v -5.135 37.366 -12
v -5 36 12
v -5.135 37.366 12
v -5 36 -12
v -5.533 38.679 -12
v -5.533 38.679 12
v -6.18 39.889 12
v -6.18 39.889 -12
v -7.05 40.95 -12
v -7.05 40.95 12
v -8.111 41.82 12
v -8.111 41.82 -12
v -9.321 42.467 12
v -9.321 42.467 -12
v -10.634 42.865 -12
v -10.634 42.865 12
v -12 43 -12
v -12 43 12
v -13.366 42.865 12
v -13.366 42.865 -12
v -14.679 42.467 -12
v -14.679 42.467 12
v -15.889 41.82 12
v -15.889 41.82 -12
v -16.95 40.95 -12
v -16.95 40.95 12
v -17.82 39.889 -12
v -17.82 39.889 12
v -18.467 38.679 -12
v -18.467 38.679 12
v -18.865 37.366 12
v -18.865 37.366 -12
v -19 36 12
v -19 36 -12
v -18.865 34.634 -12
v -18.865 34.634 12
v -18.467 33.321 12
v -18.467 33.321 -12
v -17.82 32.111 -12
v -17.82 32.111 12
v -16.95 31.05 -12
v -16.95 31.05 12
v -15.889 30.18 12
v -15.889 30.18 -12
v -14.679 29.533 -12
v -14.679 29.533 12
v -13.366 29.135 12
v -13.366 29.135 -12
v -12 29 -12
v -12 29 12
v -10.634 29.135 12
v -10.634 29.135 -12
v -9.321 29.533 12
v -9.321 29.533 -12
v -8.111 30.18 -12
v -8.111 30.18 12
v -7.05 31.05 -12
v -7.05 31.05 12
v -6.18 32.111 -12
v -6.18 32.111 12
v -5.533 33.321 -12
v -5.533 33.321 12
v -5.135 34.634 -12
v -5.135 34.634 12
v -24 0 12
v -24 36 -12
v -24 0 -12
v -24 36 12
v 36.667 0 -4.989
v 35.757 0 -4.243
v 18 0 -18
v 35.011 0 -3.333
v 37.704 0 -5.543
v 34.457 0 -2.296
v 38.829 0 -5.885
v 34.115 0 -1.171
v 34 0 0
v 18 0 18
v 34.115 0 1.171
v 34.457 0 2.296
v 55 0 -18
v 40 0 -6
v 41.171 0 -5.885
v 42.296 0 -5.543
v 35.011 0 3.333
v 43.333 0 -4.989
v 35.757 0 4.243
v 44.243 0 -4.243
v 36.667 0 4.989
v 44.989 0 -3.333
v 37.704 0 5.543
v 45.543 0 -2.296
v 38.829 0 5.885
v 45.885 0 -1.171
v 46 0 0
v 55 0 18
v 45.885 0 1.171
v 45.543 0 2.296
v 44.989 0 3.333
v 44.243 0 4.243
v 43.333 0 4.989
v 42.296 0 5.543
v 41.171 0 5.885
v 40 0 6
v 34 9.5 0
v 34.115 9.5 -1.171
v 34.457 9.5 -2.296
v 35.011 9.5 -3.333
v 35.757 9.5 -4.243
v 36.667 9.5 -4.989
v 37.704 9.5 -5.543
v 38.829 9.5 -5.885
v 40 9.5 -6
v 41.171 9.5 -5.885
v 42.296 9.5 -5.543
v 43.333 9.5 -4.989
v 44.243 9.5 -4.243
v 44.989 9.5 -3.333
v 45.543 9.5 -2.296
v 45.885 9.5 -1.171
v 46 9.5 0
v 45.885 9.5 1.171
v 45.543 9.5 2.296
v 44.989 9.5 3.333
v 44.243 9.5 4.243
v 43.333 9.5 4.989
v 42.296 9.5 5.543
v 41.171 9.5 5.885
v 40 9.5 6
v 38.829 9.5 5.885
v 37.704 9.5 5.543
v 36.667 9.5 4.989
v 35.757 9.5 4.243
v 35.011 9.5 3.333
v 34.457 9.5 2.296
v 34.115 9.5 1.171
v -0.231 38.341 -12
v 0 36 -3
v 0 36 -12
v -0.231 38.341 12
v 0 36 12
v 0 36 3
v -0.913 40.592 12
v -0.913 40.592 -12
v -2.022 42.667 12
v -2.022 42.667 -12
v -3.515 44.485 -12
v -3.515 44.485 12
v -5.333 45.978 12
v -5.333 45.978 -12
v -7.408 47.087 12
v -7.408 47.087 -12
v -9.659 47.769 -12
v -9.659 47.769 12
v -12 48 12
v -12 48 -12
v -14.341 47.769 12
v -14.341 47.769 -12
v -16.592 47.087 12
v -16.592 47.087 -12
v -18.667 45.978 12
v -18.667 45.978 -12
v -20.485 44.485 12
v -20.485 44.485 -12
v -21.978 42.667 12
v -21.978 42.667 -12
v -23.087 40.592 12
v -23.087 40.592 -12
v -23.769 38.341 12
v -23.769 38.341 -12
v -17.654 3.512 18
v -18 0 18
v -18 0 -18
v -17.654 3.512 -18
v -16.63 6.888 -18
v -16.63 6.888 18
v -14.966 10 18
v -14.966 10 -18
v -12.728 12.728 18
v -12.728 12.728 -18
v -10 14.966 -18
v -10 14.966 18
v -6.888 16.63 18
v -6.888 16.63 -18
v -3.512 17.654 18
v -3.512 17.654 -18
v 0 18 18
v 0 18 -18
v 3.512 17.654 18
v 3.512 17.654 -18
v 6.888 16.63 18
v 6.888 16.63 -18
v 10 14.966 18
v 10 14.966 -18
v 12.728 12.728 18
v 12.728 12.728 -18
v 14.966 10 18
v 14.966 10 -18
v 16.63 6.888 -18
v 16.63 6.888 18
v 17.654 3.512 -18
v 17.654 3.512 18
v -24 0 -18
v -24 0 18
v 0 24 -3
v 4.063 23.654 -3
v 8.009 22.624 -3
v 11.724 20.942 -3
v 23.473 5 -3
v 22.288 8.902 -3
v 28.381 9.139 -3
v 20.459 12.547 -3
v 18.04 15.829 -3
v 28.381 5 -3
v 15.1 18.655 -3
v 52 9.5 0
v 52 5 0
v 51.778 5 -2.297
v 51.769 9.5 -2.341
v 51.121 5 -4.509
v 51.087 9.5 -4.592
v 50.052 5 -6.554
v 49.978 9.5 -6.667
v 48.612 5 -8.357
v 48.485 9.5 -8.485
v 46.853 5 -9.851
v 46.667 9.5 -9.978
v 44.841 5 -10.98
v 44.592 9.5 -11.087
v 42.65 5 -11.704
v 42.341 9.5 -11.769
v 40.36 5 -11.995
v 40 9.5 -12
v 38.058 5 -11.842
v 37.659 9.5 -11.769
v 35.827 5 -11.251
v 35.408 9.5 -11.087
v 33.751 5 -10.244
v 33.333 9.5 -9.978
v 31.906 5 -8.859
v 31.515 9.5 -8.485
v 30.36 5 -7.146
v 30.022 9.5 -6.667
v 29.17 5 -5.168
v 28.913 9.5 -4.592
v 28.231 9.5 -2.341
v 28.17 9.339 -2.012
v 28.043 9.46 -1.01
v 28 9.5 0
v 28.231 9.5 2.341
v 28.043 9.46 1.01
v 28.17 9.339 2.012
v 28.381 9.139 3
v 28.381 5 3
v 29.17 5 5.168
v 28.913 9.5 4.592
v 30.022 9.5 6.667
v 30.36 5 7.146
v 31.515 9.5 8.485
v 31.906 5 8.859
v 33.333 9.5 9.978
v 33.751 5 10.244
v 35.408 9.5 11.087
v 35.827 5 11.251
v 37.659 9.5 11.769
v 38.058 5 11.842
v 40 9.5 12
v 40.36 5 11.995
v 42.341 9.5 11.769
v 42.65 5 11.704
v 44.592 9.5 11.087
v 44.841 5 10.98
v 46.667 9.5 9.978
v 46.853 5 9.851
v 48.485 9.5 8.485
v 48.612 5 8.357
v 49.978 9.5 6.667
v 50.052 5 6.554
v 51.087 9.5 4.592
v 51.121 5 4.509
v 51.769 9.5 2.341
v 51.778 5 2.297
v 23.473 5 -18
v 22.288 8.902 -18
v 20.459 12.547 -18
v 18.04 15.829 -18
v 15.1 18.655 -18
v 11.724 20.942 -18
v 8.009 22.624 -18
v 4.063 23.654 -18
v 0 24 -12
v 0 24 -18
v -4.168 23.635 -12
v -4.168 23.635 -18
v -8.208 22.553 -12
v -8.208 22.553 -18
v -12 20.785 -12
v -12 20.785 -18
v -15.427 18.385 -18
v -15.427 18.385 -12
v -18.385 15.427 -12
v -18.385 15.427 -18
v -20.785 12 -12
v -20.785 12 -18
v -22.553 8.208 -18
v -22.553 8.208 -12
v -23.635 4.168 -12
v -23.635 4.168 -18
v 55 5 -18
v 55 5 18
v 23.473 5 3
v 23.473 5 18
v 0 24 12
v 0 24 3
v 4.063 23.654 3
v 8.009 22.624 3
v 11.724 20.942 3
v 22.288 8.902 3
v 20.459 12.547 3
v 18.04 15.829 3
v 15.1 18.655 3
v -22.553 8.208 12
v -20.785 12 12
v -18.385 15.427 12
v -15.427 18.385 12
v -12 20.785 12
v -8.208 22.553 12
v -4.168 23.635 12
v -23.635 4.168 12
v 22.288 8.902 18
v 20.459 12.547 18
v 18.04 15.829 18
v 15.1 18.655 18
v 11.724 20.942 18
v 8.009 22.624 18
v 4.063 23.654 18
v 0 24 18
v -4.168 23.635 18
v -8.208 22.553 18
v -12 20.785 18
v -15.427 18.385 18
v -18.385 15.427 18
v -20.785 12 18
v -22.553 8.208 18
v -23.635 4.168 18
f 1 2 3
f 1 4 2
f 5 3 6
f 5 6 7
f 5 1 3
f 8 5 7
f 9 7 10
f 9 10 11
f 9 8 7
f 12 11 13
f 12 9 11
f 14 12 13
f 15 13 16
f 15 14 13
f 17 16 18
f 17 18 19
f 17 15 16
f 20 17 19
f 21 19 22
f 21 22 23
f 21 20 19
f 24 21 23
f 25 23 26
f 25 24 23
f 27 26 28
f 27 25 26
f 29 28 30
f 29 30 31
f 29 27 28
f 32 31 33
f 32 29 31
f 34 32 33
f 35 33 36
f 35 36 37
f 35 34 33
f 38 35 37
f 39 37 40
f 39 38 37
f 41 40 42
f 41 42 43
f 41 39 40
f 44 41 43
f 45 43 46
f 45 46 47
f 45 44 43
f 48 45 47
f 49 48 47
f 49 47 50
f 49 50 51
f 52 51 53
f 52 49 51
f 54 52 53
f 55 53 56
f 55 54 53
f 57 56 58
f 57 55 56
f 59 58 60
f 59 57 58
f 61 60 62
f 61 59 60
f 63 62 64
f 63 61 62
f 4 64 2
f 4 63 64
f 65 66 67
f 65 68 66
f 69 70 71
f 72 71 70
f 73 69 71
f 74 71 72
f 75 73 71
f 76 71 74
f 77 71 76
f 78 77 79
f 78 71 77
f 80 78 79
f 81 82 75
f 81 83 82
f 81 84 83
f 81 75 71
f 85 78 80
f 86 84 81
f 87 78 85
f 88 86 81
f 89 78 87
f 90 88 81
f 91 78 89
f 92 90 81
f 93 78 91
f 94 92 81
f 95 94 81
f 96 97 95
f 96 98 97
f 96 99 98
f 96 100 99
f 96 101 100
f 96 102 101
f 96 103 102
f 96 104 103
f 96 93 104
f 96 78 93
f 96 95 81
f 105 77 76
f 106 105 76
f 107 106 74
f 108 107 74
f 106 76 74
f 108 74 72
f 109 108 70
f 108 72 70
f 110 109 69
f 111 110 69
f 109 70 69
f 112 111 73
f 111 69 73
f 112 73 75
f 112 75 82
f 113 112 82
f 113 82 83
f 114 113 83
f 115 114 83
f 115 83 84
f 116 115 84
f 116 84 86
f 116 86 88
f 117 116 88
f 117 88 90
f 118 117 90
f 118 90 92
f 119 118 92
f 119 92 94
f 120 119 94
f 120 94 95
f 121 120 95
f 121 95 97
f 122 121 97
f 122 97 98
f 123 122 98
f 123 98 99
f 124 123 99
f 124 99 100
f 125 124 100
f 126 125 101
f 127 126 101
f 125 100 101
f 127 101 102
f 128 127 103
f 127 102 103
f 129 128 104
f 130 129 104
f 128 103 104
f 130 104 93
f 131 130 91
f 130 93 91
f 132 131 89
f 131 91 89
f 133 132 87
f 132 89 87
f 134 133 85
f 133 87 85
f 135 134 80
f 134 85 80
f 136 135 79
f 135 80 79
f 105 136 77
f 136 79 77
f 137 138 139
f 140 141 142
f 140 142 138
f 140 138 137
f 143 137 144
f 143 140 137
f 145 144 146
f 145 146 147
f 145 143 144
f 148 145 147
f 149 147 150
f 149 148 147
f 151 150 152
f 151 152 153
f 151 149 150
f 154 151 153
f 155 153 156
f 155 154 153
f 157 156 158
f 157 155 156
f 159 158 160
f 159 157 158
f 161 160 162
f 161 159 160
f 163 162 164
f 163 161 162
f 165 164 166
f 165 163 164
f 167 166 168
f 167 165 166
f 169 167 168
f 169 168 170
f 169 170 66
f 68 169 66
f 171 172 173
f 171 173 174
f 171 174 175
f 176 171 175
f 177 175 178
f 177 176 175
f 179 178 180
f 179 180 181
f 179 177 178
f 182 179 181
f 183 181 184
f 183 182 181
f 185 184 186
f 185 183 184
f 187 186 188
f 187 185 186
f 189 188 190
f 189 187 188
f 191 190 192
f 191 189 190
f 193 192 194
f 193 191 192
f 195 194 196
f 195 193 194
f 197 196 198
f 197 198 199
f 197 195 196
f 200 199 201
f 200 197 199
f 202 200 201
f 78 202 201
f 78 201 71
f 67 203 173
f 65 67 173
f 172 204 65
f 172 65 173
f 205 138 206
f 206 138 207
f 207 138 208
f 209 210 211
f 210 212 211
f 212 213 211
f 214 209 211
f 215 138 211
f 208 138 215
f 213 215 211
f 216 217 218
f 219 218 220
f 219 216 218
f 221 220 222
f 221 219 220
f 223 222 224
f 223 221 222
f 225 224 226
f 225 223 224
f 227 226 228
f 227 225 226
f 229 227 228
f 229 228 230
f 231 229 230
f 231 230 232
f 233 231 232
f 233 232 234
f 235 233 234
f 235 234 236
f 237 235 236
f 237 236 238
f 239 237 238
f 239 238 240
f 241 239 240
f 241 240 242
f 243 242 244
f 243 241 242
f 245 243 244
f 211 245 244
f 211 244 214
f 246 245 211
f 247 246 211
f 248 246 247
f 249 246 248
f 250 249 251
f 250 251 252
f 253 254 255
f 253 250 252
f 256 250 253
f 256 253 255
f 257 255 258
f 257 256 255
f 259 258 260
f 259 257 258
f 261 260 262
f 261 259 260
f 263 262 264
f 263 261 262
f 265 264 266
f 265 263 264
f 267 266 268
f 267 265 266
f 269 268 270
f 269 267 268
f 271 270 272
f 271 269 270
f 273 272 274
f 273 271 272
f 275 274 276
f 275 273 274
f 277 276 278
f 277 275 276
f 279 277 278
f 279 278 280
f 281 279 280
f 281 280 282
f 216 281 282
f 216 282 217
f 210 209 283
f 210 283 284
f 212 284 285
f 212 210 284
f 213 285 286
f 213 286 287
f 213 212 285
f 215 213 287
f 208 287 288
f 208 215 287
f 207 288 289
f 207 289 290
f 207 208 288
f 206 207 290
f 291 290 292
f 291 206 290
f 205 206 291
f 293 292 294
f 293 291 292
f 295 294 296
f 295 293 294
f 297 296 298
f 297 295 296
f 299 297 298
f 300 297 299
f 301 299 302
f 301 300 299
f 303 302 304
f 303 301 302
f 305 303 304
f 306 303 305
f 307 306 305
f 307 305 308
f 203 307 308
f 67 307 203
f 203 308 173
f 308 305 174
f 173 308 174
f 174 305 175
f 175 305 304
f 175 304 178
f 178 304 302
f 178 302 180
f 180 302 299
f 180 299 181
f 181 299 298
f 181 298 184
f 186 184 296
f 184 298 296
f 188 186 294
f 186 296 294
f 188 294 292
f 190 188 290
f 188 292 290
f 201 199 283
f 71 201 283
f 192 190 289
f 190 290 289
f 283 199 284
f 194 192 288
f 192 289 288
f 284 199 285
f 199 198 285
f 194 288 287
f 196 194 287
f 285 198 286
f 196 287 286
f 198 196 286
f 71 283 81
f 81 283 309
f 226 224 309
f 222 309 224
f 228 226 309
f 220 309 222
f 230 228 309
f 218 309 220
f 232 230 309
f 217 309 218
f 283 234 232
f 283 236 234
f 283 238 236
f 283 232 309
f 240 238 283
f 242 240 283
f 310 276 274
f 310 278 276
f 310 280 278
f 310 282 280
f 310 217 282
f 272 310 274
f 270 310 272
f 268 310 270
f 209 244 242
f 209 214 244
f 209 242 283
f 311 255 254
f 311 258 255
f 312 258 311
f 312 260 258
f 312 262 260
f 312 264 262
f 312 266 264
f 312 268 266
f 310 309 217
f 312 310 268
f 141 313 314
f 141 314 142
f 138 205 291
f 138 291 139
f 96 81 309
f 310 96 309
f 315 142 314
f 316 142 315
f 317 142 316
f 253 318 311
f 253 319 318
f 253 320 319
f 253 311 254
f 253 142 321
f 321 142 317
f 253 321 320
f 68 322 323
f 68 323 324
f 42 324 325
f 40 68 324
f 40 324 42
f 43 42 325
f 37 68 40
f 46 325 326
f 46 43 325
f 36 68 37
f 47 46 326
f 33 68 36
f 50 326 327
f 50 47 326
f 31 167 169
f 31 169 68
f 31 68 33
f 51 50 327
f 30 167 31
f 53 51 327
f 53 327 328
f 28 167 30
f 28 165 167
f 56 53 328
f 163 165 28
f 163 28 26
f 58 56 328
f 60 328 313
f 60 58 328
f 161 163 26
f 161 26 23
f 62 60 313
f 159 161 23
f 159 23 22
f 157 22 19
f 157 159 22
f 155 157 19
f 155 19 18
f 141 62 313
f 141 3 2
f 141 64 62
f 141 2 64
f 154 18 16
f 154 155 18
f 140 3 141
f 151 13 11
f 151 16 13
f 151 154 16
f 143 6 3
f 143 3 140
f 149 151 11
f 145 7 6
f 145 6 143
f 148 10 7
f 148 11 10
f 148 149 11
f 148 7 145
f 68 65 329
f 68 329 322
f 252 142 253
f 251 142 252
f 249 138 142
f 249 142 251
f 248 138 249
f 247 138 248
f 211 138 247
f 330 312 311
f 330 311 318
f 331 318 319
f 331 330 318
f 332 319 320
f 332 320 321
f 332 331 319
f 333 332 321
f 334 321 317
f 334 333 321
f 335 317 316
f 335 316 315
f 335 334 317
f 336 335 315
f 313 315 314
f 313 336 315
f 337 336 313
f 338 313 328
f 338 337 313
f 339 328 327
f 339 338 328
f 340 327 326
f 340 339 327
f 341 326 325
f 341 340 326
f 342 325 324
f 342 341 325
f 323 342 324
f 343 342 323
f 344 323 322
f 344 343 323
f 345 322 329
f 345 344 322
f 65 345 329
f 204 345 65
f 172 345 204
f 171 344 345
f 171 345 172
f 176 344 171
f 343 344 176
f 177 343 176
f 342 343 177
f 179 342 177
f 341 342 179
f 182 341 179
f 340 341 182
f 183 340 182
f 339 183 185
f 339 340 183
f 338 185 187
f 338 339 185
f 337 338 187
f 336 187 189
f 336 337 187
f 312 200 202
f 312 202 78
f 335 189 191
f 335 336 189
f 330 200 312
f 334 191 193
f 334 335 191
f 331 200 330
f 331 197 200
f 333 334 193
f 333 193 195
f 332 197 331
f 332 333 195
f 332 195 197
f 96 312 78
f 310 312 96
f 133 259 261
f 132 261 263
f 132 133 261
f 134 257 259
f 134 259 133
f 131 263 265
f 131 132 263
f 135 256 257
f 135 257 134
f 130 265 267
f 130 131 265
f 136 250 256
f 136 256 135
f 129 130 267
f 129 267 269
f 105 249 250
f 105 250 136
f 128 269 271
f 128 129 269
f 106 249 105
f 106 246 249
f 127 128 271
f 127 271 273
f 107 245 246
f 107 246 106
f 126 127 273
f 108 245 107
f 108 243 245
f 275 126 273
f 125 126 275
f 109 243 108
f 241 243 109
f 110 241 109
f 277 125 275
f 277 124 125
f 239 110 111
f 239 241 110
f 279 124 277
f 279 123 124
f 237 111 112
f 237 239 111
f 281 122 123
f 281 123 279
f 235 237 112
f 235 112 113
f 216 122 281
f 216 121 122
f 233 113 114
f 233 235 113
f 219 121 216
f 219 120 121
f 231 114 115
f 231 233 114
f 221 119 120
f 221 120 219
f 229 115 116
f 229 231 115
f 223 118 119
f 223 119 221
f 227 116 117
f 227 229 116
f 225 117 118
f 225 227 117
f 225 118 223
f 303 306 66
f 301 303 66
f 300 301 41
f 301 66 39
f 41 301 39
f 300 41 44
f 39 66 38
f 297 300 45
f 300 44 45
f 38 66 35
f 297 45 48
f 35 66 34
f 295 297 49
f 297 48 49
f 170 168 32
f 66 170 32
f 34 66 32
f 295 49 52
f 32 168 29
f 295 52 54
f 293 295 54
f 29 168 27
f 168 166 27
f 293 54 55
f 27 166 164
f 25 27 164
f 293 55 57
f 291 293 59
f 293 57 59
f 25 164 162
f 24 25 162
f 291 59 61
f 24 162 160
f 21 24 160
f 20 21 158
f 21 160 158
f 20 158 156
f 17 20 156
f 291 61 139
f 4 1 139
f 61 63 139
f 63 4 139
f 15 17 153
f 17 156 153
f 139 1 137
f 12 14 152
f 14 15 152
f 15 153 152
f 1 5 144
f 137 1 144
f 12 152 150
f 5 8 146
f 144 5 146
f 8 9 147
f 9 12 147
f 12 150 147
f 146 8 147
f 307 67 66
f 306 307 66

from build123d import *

# Parameters (mm, degrees)
BOSS_EXTRUDE1_DEPTH    = 18
SKETCH1_3_R            = 7
BOSS_EXTRUDE2_DEPTH    = 12
SKETCH2_R              = 12
BOSS_EXTRUDE3_DEPTH    = 4.5
RIB1_REACH             = 77.186
SKETCH3_WALL_W         = 190.924782946
SKETCH3_WALL_H         = 6
F_12_0MM_DOWEL_HOLE1_D = 12


with BuildPart() as part:
    # Sketch1 → Boss-Extrude1 (new, symmetric)
    with BuildSketch(Plane.XY):
        with BuildLine():
            Line((-24, 0), (-18, 0))
            ThreePointArc((-18, 0), (0, 18), (18, 0))
            Line((18, 0), (55, 0))
            Line((55, 0), (55, 5))
            Line((55, 5), (23.473389189, 5))
            ThreePointArc((23.473389189, 5), (-2.513827706, 23.86798421), (-24, 0))
        make_face()
    extrude(amount=BOSS_EXTRUDE1_DEPTH, both=True)

    # Sketch1<3> → Boss-Extrude2 (add, symmetric)
    with BuildSketch(Plane.XY):
        with BuildLine():
            Line((-24, 36), (-24, 0))
            ThreePointArc((-24, 0), (-16.970562748, 16.970562748), (0, 24))
            Line((0, 24), (0, 36))
            ThreePointArc((0, 36), (-12, 48), (-24, 36))
        make_face()
        with Locations((-12, 36)):
            Circle(SKETCH1_3_R, mode=Mode.SUBTRACT)
    extrude(amount=BOSS_EXTRUDE2_DEPTH, both=True)

    # Sketch2 → Boss-Extrude3 (add, symmetric)
    with BuildSketch(Plane(origin=(0, 5, 0), x_dir=(1, 0, 0), z_dir=(0, 1, 0))):
        with Locations((40, 0)):
            Circle(SKETCH2_R)
    extrude(amount=BOSS_EXTRUDE3_DEPTH, both=True)

    # Sketch3 wall → Rib1 (add, up to next)
    with BuildSketch(Plane(origin=(14, 22.75, 0), x_dir=(0.72629339981, -0.68738482482, 0), z_dir=(0.68738482482, 0.72629339981, 0)), mode=Mode.PRIVATE) as rib1_sk1:
        Rectangle(SKETCH3_WALL_W, SKETCH3_WALL_H)
    rib1_tool1 = extrude(rib1_sk1.sketch, amount=-RIB1_REACH, mode=Mode.PRIVATE) - part.part
    add(rib1_tool1.solids().sort_by_distance((14, 22.75, 0))[0])

    # Ø12.0mm Dowel Hole1 (through all)
    with Locations(Plane(origin=(0, 9.5, 0), x_dir=(1, 0, 0), z_dir=(0, 1, 0))):
        with Locations((40, 0)):
            Hole(F_12_0MM_DOWEL_HOLE1_D / 2)


solid = part.part
